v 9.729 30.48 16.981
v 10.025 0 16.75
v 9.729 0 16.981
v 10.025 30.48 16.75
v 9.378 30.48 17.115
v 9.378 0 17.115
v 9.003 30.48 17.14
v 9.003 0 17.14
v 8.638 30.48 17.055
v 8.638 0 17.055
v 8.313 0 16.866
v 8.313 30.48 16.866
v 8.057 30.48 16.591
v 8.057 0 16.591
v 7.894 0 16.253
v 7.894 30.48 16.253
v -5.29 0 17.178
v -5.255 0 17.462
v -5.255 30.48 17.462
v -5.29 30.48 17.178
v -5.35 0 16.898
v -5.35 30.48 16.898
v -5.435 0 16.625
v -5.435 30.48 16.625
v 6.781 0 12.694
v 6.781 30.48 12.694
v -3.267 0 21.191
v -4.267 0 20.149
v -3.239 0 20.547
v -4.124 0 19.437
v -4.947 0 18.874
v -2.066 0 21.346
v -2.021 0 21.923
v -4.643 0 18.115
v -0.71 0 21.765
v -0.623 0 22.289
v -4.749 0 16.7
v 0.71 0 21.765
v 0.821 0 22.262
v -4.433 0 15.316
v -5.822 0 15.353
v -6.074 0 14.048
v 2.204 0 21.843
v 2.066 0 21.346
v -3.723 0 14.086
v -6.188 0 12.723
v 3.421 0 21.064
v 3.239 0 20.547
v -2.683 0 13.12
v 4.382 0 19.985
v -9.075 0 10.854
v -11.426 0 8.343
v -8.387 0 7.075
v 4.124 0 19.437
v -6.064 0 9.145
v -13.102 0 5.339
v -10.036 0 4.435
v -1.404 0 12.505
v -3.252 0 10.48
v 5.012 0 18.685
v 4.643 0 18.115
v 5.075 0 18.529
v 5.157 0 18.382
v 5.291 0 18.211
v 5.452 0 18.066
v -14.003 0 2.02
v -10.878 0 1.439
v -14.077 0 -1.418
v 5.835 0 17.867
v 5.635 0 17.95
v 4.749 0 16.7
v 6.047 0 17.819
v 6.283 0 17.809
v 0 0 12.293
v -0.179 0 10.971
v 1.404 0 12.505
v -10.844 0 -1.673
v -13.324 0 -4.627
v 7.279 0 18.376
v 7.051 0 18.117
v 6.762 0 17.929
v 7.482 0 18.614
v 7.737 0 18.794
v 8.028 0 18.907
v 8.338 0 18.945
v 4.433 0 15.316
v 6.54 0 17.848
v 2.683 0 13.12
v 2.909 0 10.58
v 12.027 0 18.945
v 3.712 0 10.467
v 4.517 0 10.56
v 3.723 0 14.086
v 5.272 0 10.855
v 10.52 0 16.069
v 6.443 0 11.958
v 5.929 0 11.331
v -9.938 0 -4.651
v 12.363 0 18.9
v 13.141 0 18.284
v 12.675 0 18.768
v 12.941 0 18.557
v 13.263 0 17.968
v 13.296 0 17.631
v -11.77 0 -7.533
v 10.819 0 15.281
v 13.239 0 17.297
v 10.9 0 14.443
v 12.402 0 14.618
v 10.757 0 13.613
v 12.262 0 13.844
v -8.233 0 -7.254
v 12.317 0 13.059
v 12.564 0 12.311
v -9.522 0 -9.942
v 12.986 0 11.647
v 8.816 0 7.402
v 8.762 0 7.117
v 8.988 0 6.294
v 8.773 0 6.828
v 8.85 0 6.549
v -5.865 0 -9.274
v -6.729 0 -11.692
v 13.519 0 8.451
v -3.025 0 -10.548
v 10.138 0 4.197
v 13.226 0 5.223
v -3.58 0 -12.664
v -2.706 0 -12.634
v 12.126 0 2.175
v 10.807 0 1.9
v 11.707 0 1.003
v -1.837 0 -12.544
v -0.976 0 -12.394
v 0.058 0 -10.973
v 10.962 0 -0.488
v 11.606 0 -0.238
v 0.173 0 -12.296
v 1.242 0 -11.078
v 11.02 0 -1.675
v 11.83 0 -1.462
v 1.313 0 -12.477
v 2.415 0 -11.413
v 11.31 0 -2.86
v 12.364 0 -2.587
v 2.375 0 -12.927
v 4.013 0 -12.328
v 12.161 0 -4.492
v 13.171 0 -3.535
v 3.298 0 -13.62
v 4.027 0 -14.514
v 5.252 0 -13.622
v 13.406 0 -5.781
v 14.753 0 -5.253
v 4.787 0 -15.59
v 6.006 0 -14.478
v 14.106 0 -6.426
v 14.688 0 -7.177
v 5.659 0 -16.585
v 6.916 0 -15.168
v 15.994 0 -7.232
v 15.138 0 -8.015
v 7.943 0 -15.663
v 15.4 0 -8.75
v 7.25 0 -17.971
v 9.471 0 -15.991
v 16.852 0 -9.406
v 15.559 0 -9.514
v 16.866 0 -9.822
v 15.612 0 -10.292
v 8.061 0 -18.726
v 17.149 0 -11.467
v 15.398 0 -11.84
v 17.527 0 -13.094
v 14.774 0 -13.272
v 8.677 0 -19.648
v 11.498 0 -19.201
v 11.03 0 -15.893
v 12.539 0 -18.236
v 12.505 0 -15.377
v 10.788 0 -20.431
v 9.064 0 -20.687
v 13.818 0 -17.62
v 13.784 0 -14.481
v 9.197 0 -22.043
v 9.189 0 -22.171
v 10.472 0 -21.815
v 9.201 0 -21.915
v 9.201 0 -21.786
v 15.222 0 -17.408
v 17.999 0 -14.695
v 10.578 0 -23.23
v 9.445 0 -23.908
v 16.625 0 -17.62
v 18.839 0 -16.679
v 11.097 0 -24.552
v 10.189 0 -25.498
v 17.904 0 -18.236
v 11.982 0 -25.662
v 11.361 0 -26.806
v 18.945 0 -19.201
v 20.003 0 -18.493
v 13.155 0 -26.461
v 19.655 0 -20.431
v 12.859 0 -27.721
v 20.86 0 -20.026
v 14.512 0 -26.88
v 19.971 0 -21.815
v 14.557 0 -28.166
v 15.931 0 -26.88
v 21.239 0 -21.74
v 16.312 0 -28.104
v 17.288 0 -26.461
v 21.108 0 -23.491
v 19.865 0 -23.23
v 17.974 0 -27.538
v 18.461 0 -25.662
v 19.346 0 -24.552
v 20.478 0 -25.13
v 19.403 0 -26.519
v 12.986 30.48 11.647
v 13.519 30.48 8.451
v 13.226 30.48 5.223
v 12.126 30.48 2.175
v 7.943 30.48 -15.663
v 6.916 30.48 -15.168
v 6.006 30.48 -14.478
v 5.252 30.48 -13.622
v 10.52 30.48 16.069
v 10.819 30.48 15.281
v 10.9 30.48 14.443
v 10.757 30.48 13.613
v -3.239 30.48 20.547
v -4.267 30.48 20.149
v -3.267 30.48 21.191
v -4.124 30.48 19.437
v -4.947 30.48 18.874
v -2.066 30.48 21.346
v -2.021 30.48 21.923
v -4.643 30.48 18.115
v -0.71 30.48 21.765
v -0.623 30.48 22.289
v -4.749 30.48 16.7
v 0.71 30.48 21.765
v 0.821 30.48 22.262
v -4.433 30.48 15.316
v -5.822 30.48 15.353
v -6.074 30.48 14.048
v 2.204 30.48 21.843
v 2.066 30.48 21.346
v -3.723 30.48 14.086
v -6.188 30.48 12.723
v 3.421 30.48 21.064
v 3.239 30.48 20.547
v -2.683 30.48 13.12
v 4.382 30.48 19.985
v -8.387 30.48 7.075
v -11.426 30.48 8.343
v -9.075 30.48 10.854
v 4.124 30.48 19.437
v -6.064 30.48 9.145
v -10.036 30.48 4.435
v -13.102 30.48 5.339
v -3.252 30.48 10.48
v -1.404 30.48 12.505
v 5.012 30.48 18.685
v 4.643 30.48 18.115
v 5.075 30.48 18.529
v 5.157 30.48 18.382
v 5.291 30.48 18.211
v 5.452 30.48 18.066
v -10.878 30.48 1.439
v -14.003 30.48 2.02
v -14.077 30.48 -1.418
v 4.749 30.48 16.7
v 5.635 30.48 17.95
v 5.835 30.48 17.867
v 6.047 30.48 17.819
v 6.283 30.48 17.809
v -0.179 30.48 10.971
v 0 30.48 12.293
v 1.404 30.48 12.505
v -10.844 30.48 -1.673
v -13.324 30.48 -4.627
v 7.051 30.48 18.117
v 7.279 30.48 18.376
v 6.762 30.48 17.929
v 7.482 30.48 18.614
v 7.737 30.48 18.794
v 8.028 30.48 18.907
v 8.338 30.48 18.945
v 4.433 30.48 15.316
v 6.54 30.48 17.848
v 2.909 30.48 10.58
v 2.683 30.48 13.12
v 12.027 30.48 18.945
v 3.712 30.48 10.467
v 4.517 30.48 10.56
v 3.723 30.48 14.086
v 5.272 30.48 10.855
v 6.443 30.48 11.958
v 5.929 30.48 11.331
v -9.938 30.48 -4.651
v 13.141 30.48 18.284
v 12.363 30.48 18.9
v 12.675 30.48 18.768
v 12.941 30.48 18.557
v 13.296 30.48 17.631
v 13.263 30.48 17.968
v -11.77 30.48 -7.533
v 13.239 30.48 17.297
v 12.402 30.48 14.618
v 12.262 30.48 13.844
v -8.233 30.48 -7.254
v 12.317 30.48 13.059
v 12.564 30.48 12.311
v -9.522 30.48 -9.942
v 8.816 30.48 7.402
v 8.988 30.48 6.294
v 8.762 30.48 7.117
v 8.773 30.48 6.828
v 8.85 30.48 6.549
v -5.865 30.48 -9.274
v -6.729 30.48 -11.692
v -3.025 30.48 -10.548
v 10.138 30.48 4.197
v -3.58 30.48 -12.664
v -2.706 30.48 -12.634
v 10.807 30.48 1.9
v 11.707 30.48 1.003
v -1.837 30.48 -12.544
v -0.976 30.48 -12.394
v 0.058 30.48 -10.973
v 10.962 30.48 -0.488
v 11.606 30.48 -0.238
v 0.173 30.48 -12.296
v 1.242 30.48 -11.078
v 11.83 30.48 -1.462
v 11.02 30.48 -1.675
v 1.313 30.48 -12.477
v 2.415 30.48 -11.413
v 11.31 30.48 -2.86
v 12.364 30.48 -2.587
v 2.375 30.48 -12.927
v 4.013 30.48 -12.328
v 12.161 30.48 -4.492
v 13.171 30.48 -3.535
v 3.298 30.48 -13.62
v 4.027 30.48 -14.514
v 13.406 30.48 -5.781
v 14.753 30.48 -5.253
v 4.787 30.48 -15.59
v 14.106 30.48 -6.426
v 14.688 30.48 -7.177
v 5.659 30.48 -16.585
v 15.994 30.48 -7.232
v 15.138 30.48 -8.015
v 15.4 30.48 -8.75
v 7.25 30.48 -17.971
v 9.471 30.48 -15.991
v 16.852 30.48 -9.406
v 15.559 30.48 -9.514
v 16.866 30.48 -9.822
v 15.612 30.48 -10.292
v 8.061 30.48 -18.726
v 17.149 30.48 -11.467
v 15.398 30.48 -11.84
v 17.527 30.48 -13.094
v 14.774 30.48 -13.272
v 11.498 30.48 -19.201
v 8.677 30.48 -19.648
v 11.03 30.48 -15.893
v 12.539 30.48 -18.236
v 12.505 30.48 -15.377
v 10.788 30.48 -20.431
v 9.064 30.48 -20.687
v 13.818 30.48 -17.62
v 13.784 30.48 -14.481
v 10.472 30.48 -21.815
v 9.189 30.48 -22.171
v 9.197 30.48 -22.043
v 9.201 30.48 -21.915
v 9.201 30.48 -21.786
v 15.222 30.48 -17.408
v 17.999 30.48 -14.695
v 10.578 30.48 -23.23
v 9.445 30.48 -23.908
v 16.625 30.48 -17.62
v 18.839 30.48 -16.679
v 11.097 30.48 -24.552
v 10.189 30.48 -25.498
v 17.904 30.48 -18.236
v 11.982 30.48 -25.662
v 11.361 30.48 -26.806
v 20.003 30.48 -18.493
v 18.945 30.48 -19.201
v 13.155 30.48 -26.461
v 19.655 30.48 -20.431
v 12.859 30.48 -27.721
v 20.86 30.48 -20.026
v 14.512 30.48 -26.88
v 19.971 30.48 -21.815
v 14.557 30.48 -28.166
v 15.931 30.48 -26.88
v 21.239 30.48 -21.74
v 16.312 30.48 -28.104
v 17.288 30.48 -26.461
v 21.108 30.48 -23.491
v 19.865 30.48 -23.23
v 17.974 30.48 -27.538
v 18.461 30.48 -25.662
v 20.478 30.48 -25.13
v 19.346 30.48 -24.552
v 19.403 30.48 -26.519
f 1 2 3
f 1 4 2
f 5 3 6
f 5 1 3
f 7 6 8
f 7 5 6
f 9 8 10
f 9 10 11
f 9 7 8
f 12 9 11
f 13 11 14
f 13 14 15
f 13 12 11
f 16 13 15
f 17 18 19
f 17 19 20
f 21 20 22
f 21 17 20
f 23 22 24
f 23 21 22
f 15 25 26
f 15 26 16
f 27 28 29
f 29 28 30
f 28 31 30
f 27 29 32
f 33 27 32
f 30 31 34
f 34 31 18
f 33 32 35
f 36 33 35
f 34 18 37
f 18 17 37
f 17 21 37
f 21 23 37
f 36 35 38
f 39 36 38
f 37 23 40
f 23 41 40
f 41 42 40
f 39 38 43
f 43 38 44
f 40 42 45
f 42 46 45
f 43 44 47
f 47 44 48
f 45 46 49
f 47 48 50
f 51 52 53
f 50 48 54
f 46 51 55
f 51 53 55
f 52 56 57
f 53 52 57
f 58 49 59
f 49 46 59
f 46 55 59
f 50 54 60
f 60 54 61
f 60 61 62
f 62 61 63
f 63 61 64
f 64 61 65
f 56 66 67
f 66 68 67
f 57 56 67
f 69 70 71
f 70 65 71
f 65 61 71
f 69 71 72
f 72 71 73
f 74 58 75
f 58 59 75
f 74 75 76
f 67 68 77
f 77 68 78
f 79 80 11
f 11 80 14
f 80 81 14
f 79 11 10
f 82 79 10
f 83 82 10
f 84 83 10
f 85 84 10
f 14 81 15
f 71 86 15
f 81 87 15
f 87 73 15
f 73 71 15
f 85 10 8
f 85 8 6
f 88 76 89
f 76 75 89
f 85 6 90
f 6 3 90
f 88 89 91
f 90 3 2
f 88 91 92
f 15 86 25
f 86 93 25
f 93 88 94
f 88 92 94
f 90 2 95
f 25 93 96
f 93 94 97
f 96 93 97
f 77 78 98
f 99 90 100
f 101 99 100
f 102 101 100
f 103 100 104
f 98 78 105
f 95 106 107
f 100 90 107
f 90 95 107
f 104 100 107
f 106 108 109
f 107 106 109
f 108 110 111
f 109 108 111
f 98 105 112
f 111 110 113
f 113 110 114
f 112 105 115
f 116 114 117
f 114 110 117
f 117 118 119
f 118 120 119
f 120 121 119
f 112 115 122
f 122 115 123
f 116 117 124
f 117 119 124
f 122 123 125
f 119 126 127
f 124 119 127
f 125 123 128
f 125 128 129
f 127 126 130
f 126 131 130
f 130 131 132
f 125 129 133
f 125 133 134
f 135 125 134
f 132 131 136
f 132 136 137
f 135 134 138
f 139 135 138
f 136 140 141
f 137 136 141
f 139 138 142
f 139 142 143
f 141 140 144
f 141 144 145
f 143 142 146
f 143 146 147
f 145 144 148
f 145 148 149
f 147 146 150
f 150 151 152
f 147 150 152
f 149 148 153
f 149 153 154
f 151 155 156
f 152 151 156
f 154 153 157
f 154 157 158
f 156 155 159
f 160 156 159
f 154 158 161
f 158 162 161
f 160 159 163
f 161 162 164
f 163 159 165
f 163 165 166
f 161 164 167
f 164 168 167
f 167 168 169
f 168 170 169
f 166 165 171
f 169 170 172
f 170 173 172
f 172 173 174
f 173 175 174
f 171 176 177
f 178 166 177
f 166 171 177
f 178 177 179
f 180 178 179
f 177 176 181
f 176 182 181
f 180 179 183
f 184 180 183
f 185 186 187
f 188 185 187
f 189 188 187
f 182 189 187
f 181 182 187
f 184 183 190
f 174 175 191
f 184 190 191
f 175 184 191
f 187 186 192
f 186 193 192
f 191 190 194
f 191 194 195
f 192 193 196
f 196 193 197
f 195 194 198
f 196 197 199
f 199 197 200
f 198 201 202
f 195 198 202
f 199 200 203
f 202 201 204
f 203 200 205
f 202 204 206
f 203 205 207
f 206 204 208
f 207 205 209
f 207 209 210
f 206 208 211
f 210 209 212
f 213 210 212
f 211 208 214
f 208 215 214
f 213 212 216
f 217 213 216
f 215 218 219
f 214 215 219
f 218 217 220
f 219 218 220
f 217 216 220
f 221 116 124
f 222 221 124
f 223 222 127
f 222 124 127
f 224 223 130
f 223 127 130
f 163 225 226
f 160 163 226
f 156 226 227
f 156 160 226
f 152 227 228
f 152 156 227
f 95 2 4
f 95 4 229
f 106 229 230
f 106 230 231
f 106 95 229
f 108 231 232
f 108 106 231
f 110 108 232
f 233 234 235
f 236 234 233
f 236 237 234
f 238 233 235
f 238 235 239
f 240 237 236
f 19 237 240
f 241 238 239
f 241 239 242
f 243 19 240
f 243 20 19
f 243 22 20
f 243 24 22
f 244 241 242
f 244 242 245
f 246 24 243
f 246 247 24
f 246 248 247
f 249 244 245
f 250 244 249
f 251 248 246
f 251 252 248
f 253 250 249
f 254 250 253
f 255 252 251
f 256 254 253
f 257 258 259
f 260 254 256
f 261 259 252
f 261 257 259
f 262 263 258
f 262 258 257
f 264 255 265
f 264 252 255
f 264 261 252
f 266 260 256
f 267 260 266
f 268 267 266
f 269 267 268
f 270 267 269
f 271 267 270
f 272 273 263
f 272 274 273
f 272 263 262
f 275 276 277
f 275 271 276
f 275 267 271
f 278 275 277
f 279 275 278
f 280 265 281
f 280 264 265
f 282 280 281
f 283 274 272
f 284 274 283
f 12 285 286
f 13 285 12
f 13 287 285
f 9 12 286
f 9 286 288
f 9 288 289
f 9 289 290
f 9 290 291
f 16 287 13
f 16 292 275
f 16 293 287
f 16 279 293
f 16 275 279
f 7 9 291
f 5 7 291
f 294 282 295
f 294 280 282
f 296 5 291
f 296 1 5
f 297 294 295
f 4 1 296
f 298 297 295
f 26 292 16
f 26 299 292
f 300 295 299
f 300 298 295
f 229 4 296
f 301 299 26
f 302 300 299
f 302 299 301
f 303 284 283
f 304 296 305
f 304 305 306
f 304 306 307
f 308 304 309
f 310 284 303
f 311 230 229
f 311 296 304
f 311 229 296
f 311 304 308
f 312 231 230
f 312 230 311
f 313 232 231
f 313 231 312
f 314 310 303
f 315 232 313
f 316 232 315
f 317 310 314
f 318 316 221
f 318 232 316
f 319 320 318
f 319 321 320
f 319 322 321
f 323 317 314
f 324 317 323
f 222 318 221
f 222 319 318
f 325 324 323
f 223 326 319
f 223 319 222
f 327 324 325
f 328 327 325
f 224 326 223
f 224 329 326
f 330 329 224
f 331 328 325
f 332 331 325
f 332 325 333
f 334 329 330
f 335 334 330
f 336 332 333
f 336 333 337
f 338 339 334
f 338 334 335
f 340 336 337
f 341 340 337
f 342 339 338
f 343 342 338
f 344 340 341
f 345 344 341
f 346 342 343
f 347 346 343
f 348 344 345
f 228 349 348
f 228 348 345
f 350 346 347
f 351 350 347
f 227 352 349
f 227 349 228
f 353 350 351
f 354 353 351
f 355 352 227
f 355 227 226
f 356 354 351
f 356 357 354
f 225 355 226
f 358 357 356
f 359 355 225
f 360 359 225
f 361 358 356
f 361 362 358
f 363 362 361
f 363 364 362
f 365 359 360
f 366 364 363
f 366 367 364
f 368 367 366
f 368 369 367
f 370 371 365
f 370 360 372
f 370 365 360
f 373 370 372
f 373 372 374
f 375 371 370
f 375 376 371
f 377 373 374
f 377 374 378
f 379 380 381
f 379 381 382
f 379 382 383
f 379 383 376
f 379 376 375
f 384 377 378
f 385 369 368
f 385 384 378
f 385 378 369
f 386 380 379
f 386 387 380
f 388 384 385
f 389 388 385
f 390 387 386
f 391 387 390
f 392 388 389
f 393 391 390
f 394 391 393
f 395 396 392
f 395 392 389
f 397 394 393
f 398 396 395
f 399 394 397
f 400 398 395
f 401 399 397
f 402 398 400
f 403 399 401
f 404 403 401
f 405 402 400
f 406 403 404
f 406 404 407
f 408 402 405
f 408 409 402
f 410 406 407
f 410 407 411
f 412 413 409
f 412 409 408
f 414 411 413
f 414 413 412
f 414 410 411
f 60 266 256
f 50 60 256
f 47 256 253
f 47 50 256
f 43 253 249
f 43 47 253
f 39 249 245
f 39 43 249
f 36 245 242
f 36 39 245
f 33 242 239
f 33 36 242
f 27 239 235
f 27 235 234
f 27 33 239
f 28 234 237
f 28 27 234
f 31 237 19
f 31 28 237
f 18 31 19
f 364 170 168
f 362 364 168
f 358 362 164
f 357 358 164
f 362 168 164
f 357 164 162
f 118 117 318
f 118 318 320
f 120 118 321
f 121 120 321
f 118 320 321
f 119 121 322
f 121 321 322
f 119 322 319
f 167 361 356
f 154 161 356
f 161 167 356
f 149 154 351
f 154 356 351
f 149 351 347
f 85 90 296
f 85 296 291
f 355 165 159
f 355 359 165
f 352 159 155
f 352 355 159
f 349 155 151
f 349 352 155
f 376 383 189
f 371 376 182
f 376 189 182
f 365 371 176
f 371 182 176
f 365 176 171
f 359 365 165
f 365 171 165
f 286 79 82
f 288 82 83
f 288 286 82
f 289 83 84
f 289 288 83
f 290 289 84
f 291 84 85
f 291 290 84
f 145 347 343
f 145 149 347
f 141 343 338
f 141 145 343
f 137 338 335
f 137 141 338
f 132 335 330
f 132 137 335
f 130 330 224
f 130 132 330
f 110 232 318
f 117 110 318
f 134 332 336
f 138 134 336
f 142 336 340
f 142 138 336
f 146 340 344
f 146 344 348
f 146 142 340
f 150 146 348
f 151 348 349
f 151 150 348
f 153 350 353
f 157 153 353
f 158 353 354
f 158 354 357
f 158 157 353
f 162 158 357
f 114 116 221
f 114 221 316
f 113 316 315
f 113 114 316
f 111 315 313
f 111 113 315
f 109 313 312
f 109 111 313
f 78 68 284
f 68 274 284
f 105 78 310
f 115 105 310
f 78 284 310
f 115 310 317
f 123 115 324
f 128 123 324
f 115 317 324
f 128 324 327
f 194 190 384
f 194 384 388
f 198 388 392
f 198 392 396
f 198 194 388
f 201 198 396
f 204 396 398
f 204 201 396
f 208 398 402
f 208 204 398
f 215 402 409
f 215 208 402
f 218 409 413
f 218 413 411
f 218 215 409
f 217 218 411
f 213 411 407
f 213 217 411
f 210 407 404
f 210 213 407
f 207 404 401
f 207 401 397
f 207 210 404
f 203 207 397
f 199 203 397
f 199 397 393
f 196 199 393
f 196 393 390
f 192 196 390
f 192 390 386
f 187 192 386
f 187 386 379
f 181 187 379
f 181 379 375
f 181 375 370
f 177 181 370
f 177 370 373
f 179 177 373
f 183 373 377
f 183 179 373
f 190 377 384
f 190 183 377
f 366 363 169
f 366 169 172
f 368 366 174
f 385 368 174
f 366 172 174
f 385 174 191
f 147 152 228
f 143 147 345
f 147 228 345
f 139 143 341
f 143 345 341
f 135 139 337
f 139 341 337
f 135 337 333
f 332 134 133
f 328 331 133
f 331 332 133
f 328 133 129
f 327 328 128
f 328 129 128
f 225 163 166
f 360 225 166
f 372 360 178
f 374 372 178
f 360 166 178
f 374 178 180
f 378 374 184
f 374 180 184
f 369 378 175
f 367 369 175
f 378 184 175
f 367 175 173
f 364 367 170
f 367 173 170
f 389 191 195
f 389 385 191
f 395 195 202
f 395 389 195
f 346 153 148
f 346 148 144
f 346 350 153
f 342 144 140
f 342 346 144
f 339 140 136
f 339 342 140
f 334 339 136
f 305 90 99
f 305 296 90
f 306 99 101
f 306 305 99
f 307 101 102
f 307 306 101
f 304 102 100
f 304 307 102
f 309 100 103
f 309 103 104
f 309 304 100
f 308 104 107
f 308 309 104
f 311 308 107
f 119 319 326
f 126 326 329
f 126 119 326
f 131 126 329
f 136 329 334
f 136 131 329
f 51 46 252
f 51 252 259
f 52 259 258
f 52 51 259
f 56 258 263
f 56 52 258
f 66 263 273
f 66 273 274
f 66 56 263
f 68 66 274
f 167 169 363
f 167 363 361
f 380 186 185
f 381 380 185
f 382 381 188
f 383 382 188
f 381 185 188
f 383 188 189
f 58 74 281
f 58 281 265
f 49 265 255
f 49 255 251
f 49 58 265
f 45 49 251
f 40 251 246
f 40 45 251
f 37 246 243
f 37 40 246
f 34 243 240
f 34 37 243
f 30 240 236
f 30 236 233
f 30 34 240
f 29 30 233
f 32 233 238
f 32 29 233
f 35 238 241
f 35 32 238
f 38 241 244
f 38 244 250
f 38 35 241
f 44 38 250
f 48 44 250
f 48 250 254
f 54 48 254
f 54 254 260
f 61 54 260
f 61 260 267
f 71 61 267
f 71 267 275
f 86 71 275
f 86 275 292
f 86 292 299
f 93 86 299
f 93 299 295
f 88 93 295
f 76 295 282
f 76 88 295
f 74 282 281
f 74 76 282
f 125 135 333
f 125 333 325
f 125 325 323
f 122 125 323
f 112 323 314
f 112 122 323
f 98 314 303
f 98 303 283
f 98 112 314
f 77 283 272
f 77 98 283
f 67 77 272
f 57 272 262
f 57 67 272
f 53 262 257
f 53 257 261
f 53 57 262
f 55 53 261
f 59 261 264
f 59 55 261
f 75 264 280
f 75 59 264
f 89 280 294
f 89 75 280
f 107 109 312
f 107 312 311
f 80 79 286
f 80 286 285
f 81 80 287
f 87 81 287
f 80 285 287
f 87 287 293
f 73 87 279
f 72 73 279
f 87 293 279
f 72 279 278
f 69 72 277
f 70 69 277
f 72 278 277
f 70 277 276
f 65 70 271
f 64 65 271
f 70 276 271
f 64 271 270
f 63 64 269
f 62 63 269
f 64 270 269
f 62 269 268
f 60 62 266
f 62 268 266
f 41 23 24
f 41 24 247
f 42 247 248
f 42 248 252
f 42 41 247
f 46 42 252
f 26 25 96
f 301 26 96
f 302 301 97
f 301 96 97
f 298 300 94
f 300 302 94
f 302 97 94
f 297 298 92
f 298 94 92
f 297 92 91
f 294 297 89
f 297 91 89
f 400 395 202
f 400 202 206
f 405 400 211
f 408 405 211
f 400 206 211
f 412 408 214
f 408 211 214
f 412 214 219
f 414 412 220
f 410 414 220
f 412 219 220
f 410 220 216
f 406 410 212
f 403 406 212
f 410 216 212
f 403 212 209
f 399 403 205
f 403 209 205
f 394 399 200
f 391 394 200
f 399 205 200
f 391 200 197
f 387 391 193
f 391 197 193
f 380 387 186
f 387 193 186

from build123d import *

# Parameters (mm, degrees)
SKETCH1_R               = 4.7625
BOSS_EXTRUDE2_DEPTH     = 30.48
FILLET1_R               = 3.175
FILLET3_R               = 1.27
FILLET4_R               = 3.175
FILLET5_R               = 1.27
FILLET6_R               = 1.27
BOSS_EXTRUDE9_START     = -30.48
BOSS_EXTRUDE9_DEPTH     = 30.48
CUT_EXTRUDE6_START      = -30.48
CUT_EXTRUDE6_DEPTH      = 30.48
FILLET9_R               = 6.35
CUT_EXTRUDE7_DEPTH      = 44.536935081
CUT_EXTRUDE7_DEPTH_BACK = 44.536935081
BOSS_EXTRUDE11_START    = -30.48
SKETCH4_R               = 4.7625
BOSS_EXTRUDE11_DEPTH    = 30.48
FILLET10_R              = 12.7
FILLET11_R              = 12.7
CUT_EXTRUDE8_DEPTH      = 47.823412819
CUT_EXTRUDE8_DEPTH_BACK = 47.823412819
FILLET12_R              = 12.7


with BuildPart() as part:
    # Sketch1 → Boss-Extrude2 (new body)
    with BuildSketch(Plane(origin=(0, 0, 0), x_dir=(1, 0, 0), z_dir=(0, 1, 0))):
        with BuildLine():
            Line((11.860213807, -12.884548704), (13.754545104, -18.945407466))
            Line((13.754545104, -18.945407466), (7.404545104, -18.945407466))
            Line((7.404545104, -18.945407466), (6.640447212, -16.500698134))
            ThreePointArc((6.640447212, -16.500698134), (5.961240353, -16.792309403), (5.2705, -17.055438375))
            ThreePointArc((5.2705, -17.055438375), (0, -22.325938375), (-5.2705, -17.055438375))
            ThreePointArc((-5.2705, -17.055438375), (-5.919586773, -14.929400926), (-6.188032569, -12.722755117))
            ThreePointArc((-6.188032569, -12.722755117), (-14.1478, 0), (-6.188032569, 12.722755117))
            ThreePointArc((-6.188032569, 12.722755117), (-5.919586773, 14.929400926), (-5.2705, 17.055438375))
            ThreePointArc((-5.2705, 17.055438375), (0, 22.325938375), (5.2705, 17.055438375))
            ThreePointArc((5.2705, 17.055438375), (12.040379738, 12.314885712), (16.362502035, 5.2705))
            ThreePointArc((16.362502035, 5.2705), (21.633002035, 0), (16.362502035, -5.2705))
            ThreePointArc((16.362502035, -5.2705), (14.592418813, -9.361982053), (11.860213807, -12.884548704))
        make_face()
        with Locations(Location((0, 17.055438375, 0), (0, 0, 90))):
            Circle(SKETCH1_R, mode=Mode.SUBTRACT)
        with Locations(Location((16.362502035, 0, 0), (0, 0, 90))):
            Circle(SKETCH1_R, mode=Mode.SUBTRACT)
        with Locations(Location((0, -17.055438375, 0), (0, 0, 90))):
            Circle(SKETCH1_R, mode=Mode.SUBTRACT)
        with BuildLine():
            Line((5.737156066, -9.353468881), (8.338191551, -17.675407466))
            Line((8.338191551, -17.675407466), (12.027017511, -17.675407466))
            Line((12.027017511, -17.675407466), (8.623309815, -6.785342119))
            ThreePointArc((8.623309815, -6.785342119), (-7.294145861, 8.197424961), (5.737156066, -9.353468881))
        make_face(mode=Mode.SUBTRACT)
    extrude(amount=BOSS_EXTRUDE2_DEPTH)

    # Fillet1
    # the kernel refuses this fillet: 3.175 mm, written as the material it adds along each edge
    with BuildSketch(Plane(origin=(-6.188032569, 0, -12.722755117), x_dir=(-0.8747186698844794, 0, 0.4846310437389738), z_dir=(0, 1, 0))) as fillet1_piece_1:
        with BuildLine():
            CenterArc((1.675106808, -3.170499128), FILLET1_R, 93.05116293, 49.316383357)
            ThreePointArc((-0.839315123, -1.231863693), (-0.401568779, -0.628256415), (0, 0))
            ThreePointArc((0, 0), (0.753054473, -0.020055884), (1.506108946, 0))
        make_face()
    extrude(amount=30.48)
    with BuildSketch(Plane(origin=(-5.2705, 0, -17.055438375), x_dir=(-0.35770128840140486, 0, 0.9338360607065755), z_dir=(0, 1, 0))) as fillet1_piece_2:
        with BuildLine():
            CenterArc((0.51828136, -3.174477714), FILLET1_R, 91.039263795, 15.495369937)
            ThreePointArc((-0.385307362, -0.130770695), (-0.191391238, -0.069105054), (0, 0))
            ThreePointArc((0, 0), (0.230347271, -0.002089143), (0.460694542, 0))
        make_face()
    extrude(amount=30.48)
    with BuildSketch(Plane(origin=(5.2705, 0, -17.055438375), x_dir=(-0.12720688847868244, 0, -0.9918762057452392), z_dir=(0, 1, 0))) as fillet1_piece_3:
        with BuildLine():
            CenterArc((1.744769682, -3.149206953), FILLET1_R, 97.308218729, 47.663807195)
            ThreePointArc((-0.855148612, -1.326832167), (-0.414685297, -0.671723102), (0, 0))
            ThreePointArc((0, 0), (0.670443906, -0.042816458), (1.340887811, 0))
        make_face()
    extrude(amount=30.48)
    with BuildSketch(Plane(origin=(16.362502035, 0, -5.2705), x_dir=(-0.3771647323765371, 0, -0.9261461896759794), z_dir=(0, 1, 0))) as fillet1_piece_4:
        with BuildLine():
            CenterArc((1.804499427, -3.172306197), FILLET1_R, 92.360366346, 49.97819677)
            ThreePointArc((-0.70894152, -1.232399084), (-0.312723775, -0.640214629), (0, 0))
            ThreePointArc((0, 0), (0.8368693, -0.017240341), (1.673738599, 0))
        make_face()
    extrude(amount=30.48)
    with BuildSketch(Plane(origin=(16.362502035, 0, 5.2705), x_dir=(0.9898341628287173, 0, -0.14222633404954374), z_dir=(0, 1, 0))) as fillet1_piece_5:
        with BuildLine():
            CenterArc((1.950776398, -3.142723467), FILLET1_R, 98.176695151, 51.81827723)
            ThreePointArc((-0.798714948, -1.554982197), (-0.380235314, -0.787313176), (0, 0))
            ThreePointArc((0, 0), (0.749603894, -0.053579045), (1.499207787, 0))
        make_face()
    extrude(amount=30.48)
    with BuildSketch(Plane(origin=(11.860213807, 0, 12.884548704), x_dir=(0.29831988928740816, 0, 0.9544659468286695), z_dir=(0, 1, 0))) as fillet1_piece_6:
        with BuildLine():
            CenterArc((1.816465361, 3.175), FILLET1_R, 213.037149694, 56.962850306)
            ThreePointArc((-0.845191928, 1.444044923), (-0.405599886, 0.731970177), (0, 0))
            Line((0, 0), (1.816465361, 0))
        make_face()
    extrude(amount=30.48)
    with BuildSketch(Plane(origin=(5.2705, 0, 17.055438375), x_dir=(0.9268908474954334, 0, -0.37533099636080863), z_dir=(0, 1, 0))) as fillet1_piece_7:
        with BuildLine():
            CenterArc((1.820147869, -3.156511003), FILLET1_R, 96.186334825, 46.370096176)
            ThreePointArc((-0.700651409, -1.226175281), (-0.30907029, -0.636661485), (0, 0))
            ThreePointArc((0, 0), (0.73900137, -0.015364429), (1.47800274, 0))
        make_face()
    extrude(amount=30.48)
    with BuildSketch(Plane(origin=(-5.2705, 0, 17.055438375), x_dir=(0.038601082712793416, 0, 0.999254700471006), z_dir=(0, 1, 0))) as fillet1_piece_8:
        with BuildLine():
            CenterArc((0.52945245, -3.172633674), FILLET1_R, 92.212228742, 15.495369937)
            ThreePointArc((-0.436253651, -0.148061518), (-0.217455401, -0.076009068), (0, 0))
            ThreePointArc((0, 0), (0.203447006, -0.003928101), (0.406894013, 0))
        make_face()
    extrude(amount=30.48)
    # the kernel refuses this fillet: 3.175 mm, written as the material it takes off along each edge
    with BuildSketch(Plane(origin=(5.737156066, -8.75064331, 9.353468881), x_dir=(0.29831988928740744, 0, 0.9544659468286697), z_dir=(0, 1, 0))) as fillet1_2_piece_1:
        with BuildLine():
            CenterArc((3.500257324, -3.175), FILLET1_R, 90, 88.017608619)
            ThreePointArc((0.327157544, -3.065169276), (0.271751922, -1.521038893), (0, 0))
            Line((0, 0), (3.500257324, 0))
        make_face()
    extrude(amount=47.98128662, mode=Mode.SUBTRACT)

    # Fillet3
    fillet3_edges = [part.edges().sort_by_distance(p)[0] for p in [
        (13.754545104, 15.24, 18.945407466),
        (7.404545104, 15.24, 18.945407466),
    ]]
    fillet(fillet3_edges, radius=FILLET3_R)

    # Fillet4
    # the kernel refuses this fillet: 3.175 mm, written as the material it adds along each edge
    with BuildSketch(Plane(origin=(12.027017511, 0, 17.675407466), x_dir=(-0.29831988928740777, 0, -0.9544659468286695), z_dir=(0, 1, 0))) as fillet4_piece_1:
        with BuildLine():
            CenterArc((4.256556411, 3.175), FILLET4_R, 173.746252409, 96.253747591)
            Line((1.100450152, 3.520858762), (1.037328027, 3.527775938))
            ThreePointArc((1.037328027, 3.527775938), (0.489616488, 1.779372694), (-0.060608588, 0.018943313))
            Line((-0.060608588, 0.018943313), (0, -0.0635))
            Line((0, -0.0635), (4.256556411, -0.0635))
            Line((4.256556411, -0.0635), (4.256556411, 0))
        make_face()
    extrude(amount=30.48)

    # Fillet5
    fillet5_edges = [part.edges().sort_by_distance(p)[0] for p in [
        (8.338191551, 15.24, 17.675407466),
    ]]
    fillet(fillet5_edges, radius=FILLET5_R)

    # Fillet6
    fillet6_edges = [part.edges().sort_by_distance(p)[0] for p in [
        (6.640447212, 15.24, 16.500698134),
        (8.623309815, 15.24, 6.785342119),
    ]]
    fillet(fillet6_edges, radius=FILLET6_R)

    # Sketch2 → Boss-Extrude9 (add)
    with BuildSketch(Plane(origin=(0, 30.48, 0), x_dir=(1, 0, 0), z_dir=(0, 1, 0)).offset(BOSS_EXTRUDE9_START)):
        with BuildLine():
            ThreePointArc((7.943426233, 15.662766674), (13.175324303, 14.973004025), (15.611766116, 10.291948459))
            ThreePointArc((15.611766116, 10.291948459), (15.492196473, 9.129027942), (15.138490831, 8.014768839))
            ThreePointArc((15.138490831, 8.014768839), (15.444654673, 7.422560084), (15.731226864, 6.820626626))
            ThreePointArc((15.731226864, 6.820626626), (15.781158654, 6.716236617), (15.834861283, 6.61373547))
            ThreePointArc((15.834861283, 6.61373547), (16.614943687, 8.379799111), (16.881766116, 10.291948459))
            ThreePointArc((16.881766116, 10.291948459), (13.476256049, 16.290071233), (6.580412696, 16.439470316))
            ThreePointArc((6.580412696, 16.439470316), (6.637545403, 16.407150651), (6.69533405, 16.376019005))
            ThreePointArc((6.69533405, 16.376019005), (7.325689413, 16.030433186), (7.943426233, 15.662766674))
        make_face()
    extrude(amount=BOSS_EXTRUDE9_DEPTH)

    # Sketch2<12> → Cut-Extrude6 (cut)
    with BuildSketch(Plane(origin=(0, 30.48, 0), x_dir=(1, 0, 0), z_dir=(0, 1, 0)).offset(CUT_EXTRUDE6_START)):
        with BuildLine():
            ThreePointArc((15.138490831, 8.014768839), (12.043511127, 12.311557951), (7.943426233, 15.662766674))
            ThreePointArc((7.943426233, 15.662766674), (5.173639716, 13.509603196), (4.183683511, 10.143920944))
            ThreePointArc((4.183683511, 10.143920944), (7.605607592, 7.90930294), (9.972426866, 4.577449316))
            ThreePointArc((9.972426866, 4.577449316), (13.062589614, 5.533925069), (15.138490831, 8.014768839))
        make_face()
    extrude(amount=CUT_EXTRUDE6_DEPTH, mode=Mode.SUBTRACT)

    # Fillet9
    fillet9_edges = [part.edges().sort_by_distance(p)[0] for p in [
        (6.580412696, 15.24, -16.439470316),
        (15.834861283, 15.24, -6.61373547),
        (9.972426866, 15.24, -4.577449316),
        (4.183683511, 15.24, -10.143920944),
    ]]
    fillet(fillet9_edges, radius=FILLET9_R)

    # Sketch3 → Cut-Extrude7 (cut, two sides: drawn at the far end of the back side and taken through both)
    with BuildSketch(Plane(origin=(0, 30.48, 0), x_dir=(1, 0, 0), z_dir=(0, 1, 0)).offset(-CUT_EXTRUDE7_DEPTH_BACK)):
        with BuildLine():
            Line((-7.505454184, 11.992847966), (-2.296148987, 12.883016287))
            ThreePointArc((-2.296148987, 12.883016287), (2.423426985, 12.955632538), (4.7625, 17.055438375))
            Line((4.7625, 17.055438375), (9.734184624, 17.275056095))
            ThreePointArc((9.734184624, 17.275056095), (-1.208436668, 22.214922829), (-7.505454184, 11.992847966))
        make_face()
    extrude(amount=CUT_EXTRUDE7_DEPTH + CUT_EXTRUDE7_DEPTH_BACK, mode=Mode.SUBTRACT)

    # Sketch4 → Boss-Extrude11 (add)
    with BuildSketch(Plane(origin=(0, 30.48, 0), x_dir=(1, 0, 0), z_dir=(0, 1, 0)).offset(BOSS_EXTRUDE11_START)):
        with BuildLine():
            ThreePointArc((16.86594215, 9.822043775), (17.712963238, 13.767422556), (19.105519309, 17.554802394))
            ThreePointArc((19.105519309, 17.554802394), (17.767180424, 27.639662161), (9.18901652, 22.17059903))
            ThreePointArc((9.18901652, 22.17059903), (9.198998035, 21.978650402), (9.201259866, 21.786455734))
            ThreePointArc((9.201259866, 21.786455734), (7.906472539, 18.553470941), (4.7625, 17.055438375))
            Line((4.7625, 17.055438375), (9.734184624, 17.275056095))
            ThreePointArc((9.734184624, 17.275056095), (14.943475982, 15.121124841), (16.86594215, 9.822043775))
        make_face()
        with Locations(Location((15.22151652, 22.17059903, 0), (0, 0, 270))):
            Circle(SKETCH4_R, mode=Mode.SUBTRACT)
    extrude(amount=BOSS_EXTRUDE11_DEPTH)

    # Fillet10
    fillet10_edges = [part.edges().sort_by_distance(p)[0] for p in [
        (4.7625, 15.24, -17.055438375),
        (19.105519309, 15.24, -17.554802394),
        (-7.505454184, 15.24, -11.992847966),
    ]]
    fillet(fillet10_edges, radius=FILLET10_R)

    # Fillet11
    # the kernel refuses this fillet: 12.7 mm, written as the material it takes off along each edge
    with BuildSketch(Plane(origin=(-2.296148987, -3.519120011, -12.883016287), x_dir=(0.9377307104980771, 0, 0.3473630875449655), z_dir=(0, 1, 0))) as fillet11_piece_1:
        with BuildLine():
            CenterArc((3.28451201, -12.560548615), FILLET11_R, 98.498560753, 11.829576247)
            Line((-1.127419619, -0.651524335), (-1.215658252, -0.413343849))
            ThreePointArc((-1.215658252, -0.413343849), (-0.690798794, -0.105843114), (-0.127088985, 0.219919053))
            Line((-0.127088985, 0.219919053), (0.03753728, 0.251210972))
            ThreePointArc((0.03753728, 0.251210972), (0.703824002, 0.201705731), (1.370110724, 0.251210972))
            Line((1.370110724, 0.251210972), (1.407648004, 0))
        make_face()
    extrude(amount=37.518240022, mode=Mode.SUBTRACT)

    # Sketch6 → Cut-Extrude8 (cut, two sides: drawn at the far end of the back side and taken through both)
    with BuildSketch(Plane(origin=(0, 30.48, 0), x_dir=(1, 0, 0), z_dir=(0, 1, 0)).offset(-CUT_EXTRUDE8_DEPTH_BACK)):
        Polygon((16.86594215, 9.822043775), (16.362502035, -4.7625), (12.986367949, -11.647054469), (20.424487513, -6.754467336), (23.855992578, 4.7625), align=None)
    extrude(amount=CUT_EXTRUDE8_DEPTH + CUT_EXTRUDE8_DEPTH_BACK, mode=Mode.SUBTRACT)

    # Fillet12
    # the kernel refuses this fillet: 12.7 mm, written as the material it takes off along each edge
    with BuildSketch(Plane(origin=(16.362502035, -19.16953501, 4.7625), x_dir=(-0.44029942358179885, 0, 0.897850999661712), z_dir=(0, 1, 0))) as fillet12_piece_1:
        with BuildLine():
            CenterArc((9.725565923, -12.532184847), FILLET12_R, 99.324611407, 43.978540744)
            Line((-0.457402302, -4.942905689), (-0.661061666, -4.791120106))
            ThreePointArc((-0.661061666, -4.791120106), (0.213304295, -2.51235476), (-0.228054154, -0.111836054))
            Line((-0.228054154, -0.111836054), (0, 0.254))
            ThreePointArc((0, 0.254), (3.833907002, 0.254), (7.626658966, 0.250643697))
            Line((7.626658966, 0.250643697), (7.667814004, 0))
        make_face()
    extrude(amount=68.819070021, mode=Mode.SUBTRACT)
    with BuildSketch(Plane(origin=(16.690901757, 42.122927143, -4.751164054), x_dir=(-0.9451540669307225, 0, 0.3266248456016706), z_dir=(0, -1, 0))) as fillet12_piece_2:
        with BuildLine():
            CenterArc((8.690437274, 11.688849387), FILLET12_R, 215.318855045, 31.663113493)
            Line((-1.67209449, 4.346647031), (-1.879345125, 4.199802984))
            ThreePointArc((-1.879345125, 4.199802984), (-1.073111415, 2.082128235), (-0.23706417, -0.09119528))
            Line((-0.23706417, -0.09119528), (0.099319283, -0.233776988))
            ThreePointArc((0.099319283, -0.233776988), (1.862236559, 0.12518148), (3.625153834, -0.233776988))
            Line((3.625153834, -0.233776988), (3.724473117, 0))
        make_face()
    extrude(amount=53.765854287, mode=Mode.SUBTRACT)


solid = part.part
